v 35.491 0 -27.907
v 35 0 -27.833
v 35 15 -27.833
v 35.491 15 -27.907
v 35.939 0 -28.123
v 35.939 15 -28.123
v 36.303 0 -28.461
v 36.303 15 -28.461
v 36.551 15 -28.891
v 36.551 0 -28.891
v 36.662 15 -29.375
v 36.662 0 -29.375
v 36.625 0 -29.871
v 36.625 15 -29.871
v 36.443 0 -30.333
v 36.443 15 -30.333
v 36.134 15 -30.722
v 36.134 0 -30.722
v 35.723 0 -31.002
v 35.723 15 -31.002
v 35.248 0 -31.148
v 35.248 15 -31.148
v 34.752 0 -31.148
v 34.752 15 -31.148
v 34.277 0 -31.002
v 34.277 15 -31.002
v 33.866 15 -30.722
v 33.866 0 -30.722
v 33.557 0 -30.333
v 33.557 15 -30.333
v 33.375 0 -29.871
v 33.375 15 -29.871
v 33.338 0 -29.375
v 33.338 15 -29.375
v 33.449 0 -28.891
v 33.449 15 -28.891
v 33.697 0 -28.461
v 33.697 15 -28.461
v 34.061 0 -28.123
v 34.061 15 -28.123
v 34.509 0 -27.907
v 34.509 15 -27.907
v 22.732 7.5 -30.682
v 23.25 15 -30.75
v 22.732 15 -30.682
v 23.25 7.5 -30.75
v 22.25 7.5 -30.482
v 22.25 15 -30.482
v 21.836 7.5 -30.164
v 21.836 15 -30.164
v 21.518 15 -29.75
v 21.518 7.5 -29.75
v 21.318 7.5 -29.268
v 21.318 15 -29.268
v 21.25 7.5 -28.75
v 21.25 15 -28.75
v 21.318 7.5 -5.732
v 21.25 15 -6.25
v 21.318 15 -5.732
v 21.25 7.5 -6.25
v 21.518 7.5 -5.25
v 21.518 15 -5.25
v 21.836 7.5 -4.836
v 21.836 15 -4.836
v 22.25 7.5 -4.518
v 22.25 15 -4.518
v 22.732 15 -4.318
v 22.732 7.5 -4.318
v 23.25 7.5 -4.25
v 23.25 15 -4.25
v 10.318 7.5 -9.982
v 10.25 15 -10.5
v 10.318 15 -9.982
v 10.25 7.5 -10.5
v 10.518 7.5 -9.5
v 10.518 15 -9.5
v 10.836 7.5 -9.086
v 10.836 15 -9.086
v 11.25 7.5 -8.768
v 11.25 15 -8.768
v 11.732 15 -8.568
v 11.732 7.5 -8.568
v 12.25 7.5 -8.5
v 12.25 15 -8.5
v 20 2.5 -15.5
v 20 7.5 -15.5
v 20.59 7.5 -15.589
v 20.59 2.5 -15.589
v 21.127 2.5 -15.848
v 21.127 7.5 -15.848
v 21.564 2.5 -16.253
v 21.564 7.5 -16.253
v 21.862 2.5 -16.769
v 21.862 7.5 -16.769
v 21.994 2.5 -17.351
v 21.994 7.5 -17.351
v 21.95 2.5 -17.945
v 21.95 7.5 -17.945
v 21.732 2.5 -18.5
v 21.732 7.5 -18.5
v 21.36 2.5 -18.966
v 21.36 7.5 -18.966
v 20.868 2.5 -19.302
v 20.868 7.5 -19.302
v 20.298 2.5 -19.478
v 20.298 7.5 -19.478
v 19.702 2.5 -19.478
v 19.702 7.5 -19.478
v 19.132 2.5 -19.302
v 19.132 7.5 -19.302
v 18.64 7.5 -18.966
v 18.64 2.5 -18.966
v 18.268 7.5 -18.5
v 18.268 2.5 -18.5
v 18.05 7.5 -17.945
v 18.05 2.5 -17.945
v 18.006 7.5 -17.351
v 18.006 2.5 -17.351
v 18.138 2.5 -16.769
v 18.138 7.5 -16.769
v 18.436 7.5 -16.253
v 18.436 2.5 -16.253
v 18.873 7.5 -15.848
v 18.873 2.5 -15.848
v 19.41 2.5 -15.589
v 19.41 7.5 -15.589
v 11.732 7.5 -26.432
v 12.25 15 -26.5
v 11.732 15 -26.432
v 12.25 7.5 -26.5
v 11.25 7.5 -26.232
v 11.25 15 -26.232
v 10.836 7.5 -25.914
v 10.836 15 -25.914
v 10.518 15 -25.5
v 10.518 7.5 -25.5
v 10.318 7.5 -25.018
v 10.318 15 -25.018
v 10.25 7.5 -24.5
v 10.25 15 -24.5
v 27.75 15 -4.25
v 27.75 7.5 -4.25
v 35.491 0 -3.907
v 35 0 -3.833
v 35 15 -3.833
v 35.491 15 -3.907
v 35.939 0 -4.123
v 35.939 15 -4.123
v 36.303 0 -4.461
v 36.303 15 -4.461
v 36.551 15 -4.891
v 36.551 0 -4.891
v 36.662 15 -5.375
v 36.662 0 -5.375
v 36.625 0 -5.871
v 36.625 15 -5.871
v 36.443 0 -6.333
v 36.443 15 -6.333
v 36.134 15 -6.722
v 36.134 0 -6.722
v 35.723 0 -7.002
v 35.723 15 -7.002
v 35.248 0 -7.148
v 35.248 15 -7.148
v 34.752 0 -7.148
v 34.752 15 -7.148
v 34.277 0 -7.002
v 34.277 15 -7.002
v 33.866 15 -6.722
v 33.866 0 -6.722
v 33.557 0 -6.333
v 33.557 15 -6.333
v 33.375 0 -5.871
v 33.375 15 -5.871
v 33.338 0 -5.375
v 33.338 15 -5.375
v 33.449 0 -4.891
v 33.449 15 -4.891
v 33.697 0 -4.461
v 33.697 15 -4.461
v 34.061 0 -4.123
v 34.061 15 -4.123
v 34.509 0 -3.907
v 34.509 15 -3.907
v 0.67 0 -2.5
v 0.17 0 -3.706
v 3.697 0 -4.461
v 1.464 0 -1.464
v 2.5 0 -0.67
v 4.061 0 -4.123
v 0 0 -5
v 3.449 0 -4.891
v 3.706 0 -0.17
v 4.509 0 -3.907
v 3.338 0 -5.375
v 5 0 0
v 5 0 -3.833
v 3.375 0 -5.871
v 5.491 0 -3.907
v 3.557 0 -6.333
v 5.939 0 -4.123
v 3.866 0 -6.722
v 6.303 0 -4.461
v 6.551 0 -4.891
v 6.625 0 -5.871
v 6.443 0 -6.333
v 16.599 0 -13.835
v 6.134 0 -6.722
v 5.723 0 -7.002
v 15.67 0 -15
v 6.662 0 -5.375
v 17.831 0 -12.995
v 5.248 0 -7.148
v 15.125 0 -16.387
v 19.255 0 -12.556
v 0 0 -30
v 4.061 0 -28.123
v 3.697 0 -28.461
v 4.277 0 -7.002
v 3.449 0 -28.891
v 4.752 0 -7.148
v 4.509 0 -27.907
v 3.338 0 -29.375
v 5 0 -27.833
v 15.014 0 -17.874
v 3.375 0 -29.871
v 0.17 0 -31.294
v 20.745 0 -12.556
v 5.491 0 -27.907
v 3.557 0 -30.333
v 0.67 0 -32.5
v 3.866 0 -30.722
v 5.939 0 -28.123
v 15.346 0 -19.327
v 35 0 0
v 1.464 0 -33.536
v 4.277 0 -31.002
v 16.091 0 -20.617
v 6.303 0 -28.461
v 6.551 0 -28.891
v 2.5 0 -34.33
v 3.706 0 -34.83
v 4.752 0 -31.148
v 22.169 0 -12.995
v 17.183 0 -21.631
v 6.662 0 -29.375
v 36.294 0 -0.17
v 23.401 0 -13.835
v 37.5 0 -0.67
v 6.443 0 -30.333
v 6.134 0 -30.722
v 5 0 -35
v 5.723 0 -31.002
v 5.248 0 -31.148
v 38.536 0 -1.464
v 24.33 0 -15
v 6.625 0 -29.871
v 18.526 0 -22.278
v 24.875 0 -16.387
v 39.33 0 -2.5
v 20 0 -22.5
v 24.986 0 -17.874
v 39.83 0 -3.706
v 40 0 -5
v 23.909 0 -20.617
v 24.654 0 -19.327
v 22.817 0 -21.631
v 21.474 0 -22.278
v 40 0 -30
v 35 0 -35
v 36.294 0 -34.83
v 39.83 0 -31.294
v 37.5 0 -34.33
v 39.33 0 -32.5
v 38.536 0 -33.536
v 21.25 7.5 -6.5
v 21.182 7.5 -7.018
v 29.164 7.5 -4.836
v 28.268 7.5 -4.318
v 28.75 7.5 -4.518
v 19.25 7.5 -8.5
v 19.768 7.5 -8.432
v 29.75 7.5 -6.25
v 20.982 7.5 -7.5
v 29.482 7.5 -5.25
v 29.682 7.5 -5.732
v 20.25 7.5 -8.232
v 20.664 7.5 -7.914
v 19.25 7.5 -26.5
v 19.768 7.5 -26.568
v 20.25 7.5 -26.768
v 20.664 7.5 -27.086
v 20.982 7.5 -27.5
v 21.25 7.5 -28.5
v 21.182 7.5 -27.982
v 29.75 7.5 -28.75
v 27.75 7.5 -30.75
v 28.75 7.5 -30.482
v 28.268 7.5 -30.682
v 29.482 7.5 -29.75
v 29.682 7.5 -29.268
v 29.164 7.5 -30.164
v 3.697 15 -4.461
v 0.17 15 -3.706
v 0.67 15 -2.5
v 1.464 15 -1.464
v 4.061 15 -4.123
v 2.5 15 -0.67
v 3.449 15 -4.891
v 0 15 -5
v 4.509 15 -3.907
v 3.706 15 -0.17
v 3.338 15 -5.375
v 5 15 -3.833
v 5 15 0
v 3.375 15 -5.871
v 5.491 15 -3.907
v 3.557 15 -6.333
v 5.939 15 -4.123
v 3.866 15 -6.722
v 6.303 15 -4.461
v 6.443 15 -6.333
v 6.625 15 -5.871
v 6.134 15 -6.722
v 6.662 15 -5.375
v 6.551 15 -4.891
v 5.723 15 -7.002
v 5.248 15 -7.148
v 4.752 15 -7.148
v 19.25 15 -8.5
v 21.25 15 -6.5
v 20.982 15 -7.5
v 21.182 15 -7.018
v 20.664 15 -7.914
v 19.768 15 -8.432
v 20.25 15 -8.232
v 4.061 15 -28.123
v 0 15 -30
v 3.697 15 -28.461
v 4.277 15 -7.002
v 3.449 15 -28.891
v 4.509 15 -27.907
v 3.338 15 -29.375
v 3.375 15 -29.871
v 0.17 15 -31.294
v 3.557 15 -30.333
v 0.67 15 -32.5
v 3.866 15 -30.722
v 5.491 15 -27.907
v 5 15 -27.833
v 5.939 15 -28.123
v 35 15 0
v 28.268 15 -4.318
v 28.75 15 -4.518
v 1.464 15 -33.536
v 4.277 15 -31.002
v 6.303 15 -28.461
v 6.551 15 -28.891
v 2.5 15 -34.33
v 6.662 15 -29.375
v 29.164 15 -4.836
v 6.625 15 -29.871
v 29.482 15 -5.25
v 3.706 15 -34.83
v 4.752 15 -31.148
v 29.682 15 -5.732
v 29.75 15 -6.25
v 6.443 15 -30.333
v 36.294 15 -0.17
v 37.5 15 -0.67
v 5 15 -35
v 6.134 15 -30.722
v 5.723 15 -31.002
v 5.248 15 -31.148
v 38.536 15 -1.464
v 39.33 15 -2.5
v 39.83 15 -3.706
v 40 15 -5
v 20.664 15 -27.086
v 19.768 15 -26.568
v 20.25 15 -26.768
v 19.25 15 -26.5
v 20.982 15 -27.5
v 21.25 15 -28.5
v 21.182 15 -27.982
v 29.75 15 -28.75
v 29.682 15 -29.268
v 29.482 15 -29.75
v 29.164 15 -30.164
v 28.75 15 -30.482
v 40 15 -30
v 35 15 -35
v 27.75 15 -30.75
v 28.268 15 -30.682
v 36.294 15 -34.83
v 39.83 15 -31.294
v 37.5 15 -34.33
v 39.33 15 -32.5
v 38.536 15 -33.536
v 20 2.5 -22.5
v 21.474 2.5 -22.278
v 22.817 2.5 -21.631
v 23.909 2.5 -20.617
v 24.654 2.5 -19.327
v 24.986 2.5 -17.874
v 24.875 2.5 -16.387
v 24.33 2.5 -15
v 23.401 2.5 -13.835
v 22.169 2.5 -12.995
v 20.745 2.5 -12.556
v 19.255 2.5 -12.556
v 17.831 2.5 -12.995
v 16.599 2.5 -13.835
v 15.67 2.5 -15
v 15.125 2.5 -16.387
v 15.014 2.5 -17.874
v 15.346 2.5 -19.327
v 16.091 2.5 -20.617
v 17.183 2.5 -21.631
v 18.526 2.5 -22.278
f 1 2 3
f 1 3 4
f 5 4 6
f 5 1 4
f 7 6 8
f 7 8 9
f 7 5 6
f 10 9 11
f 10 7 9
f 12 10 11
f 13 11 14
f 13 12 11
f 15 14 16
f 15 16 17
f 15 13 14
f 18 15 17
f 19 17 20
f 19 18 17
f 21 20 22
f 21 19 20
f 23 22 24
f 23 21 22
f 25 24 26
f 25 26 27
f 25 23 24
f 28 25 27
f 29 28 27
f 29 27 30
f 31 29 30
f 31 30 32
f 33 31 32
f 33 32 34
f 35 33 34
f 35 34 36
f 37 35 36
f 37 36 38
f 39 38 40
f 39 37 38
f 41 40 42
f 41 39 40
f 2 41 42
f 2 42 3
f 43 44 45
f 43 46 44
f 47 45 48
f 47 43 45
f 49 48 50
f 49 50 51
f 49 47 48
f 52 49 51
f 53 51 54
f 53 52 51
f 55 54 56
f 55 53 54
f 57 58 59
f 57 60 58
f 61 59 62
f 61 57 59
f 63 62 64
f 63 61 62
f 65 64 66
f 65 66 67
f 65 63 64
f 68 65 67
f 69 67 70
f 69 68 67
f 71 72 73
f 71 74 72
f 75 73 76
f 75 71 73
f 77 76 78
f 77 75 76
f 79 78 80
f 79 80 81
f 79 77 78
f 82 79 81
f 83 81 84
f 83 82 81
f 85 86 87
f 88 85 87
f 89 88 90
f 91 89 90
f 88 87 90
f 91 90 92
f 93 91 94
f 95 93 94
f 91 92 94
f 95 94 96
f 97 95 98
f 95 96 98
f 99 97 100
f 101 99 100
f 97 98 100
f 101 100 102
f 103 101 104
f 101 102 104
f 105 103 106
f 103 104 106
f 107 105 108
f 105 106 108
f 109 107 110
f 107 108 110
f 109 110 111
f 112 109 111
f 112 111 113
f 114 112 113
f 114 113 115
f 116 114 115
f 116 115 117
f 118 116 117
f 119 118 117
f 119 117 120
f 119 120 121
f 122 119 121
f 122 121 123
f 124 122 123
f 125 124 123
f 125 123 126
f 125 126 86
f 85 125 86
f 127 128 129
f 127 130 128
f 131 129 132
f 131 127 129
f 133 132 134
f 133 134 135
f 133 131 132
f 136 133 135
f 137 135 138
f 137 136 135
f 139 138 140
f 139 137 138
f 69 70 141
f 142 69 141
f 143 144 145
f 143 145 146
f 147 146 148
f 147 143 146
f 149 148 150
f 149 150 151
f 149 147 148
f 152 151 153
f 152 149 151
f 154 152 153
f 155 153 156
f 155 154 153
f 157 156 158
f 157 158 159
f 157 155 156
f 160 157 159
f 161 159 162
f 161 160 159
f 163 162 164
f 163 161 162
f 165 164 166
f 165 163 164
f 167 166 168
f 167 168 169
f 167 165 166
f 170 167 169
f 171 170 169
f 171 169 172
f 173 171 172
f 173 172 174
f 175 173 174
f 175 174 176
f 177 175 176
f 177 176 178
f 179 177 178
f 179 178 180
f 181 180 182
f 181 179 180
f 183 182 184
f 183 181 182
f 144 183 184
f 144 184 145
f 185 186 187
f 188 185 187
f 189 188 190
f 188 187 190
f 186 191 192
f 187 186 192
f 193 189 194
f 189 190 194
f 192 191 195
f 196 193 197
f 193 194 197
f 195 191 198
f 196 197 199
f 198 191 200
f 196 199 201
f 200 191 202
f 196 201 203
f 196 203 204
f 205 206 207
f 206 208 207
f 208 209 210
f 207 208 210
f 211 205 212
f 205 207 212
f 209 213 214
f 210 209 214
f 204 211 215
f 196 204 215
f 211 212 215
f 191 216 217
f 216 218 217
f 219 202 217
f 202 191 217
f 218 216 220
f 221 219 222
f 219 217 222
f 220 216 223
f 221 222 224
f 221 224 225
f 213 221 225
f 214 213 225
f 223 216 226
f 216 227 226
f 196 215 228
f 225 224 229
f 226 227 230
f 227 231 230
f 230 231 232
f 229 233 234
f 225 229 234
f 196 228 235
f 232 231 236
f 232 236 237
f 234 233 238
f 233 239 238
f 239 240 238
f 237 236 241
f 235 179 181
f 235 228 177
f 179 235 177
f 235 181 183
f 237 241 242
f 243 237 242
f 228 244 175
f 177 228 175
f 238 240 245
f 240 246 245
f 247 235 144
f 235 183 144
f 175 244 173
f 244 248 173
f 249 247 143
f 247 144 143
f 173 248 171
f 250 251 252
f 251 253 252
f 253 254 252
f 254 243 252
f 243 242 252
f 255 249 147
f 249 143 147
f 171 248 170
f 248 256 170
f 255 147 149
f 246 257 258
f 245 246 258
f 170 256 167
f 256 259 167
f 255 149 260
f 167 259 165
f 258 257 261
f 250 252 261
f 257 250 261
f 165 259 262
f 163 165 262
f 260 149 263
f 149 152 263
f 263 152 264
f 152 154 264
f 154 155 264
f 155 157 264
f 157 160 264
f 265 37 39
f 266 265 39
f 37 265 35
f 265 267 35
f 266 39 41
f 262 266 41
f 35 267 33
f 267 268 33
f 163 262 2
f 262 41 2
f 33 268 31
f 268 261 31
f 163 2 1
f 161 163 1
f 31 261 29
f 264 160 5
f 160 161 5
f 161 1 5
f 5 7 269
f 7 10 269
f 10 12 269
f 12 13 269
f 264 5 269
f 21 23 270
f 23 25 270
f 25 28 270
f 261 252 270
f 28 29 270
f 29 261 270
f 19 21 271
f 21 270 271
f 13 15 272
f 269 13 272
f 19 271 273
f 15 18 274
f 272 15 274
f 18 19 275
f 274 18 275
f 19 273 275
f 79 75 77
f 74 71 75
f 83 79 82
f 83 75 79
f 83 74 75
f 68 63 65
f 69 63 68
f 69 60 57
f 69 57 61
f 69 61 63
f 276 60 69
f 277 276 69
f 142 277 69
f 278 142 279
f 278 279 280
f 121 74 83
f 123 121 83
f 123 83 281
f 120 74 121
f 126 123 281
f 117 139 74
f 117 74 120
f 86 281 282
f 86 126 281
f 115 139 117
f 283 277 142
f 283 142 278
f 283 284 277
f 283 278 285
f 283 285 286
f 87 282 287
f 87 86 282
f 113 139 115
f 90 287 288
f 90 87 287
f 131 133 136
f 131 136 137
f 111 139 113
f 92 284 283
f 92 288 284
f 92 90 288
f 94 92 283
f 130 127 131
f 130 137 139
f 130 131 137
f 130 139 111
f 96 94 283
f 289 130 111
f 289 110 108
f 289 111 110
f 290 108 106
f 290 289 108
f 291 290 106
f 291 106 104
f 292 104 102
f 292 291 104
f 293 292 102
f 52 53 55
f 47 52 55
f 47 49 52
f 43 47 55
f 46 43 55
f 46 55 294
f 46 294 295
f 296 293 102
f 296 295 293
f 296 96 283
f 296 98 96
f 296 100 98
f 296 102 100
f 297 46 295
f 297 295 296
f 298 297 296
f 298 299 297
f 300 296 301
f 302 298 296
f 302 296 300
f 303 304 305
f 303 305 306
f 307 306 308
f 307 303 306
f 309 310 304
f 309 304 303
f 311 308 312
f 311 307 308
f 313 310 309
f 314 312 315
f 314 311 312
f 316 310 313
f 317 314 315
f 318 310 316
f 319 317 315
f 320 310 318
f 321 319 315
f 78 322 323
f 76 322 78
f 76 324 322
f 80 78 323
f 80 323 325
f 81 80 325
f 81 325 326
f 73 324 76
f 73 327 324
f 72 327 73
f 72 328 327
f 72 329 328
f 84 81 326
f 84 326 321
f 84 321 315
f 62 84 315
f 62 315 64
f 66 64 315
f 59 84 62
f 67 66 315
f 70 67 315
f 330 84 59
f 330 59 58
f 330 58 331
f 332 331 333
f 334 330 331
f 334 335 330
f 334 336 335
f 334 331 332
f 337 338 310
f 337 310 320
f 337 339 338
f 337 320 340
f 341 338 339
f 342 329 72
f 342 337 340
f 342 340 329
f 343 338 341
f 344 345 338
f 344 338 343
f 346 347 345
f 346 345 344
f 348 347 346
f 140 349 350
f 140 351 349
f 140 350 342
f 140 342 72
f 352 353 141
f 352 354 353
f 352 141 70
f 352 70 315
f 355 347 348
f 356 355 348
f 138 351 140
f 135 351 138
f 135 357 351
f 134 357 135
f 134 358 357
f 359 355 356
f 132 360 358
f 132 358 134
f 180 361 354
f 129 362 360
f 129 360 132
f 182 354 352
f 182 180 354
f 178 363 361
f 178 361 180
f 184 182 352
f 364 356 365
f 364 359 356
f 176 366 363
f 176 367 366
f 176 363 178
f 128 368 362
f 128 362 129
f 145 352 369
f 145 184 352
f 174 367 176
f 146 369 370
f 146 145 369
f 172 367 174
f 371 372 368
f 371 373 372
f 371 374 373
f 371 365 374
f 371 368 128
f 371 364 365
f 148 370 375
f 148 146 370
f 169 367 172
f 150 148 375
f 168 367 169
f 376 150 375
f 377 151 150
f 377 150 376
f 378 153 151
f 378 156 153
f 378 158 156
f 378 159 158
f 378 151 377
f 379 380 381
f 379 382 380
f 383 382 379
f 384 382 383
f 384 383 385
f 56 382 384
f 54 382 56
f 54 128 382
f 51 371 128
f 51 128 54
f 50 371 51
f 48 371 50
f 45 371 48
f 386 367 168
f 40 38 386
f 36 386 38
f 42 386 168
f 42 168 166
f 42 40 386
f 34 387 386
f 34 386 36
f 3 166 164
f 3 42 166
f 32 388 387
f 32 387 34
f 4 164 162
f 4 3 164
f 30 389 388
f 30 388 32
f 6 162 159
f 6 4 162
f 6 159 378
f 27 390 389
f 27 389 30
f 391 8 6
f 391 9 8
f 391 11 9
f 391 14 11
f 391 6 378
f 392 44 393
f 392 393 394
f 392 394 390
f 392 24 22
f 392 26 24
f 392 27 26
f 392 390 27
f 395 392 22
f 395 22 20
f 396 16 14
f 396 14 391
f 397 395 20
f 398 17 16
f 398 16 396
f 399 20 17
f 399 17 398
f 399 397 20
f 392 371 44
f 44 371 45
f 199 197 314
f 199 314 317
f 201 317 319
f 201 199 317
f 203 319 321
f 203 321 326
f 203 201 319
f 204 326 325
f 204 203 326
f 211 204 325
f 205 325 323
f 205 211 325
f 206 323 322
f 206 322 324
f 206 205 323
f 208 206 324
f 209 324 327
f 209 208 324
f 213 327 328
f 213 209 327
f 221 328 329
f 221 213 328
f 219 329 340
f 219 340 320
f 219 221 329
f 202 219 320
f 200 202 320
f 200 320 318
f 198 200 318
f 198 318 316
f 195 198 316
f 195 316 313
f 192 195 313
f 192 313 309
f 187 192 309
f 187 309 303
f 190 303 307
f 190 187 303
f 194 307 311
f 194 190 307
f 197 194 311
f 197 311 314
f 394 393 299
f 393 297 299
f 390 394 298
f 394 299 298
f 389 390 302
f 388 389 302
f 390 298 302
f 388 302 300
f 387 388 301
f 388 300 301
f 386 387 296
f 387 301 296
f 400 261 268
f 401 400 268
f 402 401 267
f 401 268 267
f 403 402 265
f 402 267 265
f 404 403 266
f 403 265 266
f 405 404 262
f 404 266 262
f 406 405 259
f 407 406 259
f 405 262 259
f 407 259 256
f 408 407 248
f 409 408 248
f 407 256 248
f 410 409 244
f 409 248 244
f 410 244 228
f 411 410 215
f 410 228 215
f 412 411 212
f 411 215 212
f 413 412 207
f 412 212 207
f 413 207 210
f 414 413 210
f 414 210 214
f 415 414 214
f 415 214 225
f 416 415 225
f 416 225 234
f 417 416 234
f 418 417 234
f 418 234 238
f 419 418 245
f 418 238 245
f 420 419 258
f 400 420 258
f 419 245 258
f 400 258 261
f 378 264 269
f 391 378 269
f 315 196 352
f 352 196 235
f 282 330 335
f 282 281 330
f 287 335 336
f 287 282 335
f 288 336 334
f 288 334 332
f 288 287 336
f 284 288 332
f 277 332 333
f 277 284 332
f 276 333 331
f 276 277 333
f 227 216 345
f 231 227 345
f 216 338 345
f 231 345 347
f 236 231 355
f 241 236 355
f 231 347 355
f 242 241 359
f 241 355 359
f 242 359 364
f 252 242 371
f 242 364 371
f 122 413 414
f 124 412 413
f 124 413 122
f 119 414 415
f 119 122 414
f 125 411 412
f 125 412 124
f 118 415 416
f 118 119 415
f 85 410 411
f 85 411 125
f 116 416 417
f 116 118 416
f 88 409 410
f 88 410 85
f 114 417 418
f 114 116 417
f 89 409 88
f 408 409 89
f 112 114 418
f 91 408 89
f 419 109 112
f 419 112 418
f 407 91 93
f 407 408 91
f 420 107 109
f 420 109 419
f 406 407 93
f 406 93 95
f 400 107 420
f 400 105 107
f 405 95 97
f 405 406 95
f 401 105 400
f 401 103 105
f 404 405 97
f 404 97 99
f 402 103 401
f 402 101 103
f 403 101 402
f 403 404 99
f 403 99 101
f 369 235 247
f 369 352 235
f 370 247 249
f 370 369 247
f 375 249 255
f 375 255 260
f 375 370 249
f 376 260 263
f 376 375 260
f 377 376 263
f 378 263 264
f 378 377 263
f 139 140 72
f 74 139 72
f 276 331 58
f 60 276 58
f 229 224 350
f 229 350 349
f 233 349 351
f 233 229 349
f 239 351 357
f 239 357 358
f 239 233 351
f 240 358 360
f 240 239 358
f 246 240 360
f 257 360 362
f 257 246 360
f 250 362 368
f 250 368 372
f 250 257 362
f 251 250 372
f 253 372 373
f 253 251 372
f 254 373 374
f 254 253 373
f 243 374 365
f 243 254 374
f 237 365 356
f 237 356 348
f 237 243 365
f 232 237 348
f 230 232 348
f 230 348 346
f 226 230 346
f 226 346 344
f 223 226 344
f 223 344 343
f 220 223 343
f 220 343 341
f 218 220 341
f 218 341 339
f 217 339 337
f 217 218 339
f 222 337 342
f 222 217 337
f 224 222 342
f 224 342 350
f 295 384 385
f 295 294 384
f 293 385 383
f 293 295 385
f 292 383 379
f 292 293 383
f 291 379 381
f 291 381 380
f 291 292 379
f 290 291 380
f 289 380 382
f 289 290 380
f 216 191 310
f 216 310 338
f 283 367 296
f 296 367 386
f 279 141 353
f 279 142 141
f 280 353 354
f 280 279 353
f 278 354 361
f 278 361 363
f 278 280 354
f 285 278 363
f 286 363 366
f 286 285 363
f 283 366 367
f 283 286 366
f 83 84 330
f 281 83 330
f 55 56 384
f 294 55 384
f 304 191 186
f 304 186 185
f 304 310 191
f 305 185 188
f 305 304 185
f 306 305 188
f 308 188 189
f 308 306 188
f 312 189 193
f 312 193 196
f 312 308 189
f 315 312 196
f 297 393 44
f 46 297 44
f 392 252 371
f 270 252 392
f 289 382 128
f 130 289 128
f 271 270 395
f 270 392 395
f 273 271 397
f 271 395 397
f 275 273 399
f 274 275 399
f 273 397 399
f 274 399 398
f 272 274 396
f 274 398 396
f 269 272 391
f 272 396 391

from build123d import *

# Parameters (mm, degrees)
SKETCH1_W           = 40
SKETCH1_H           = 35
SKETCH1_R           = 1.666666667
BOSS_EXTRUDE1_DEPTH = 15
FILLET1_R           = 5
CUT_EXTRUDE1_DEPTH  = 7.5
FILLET2_R           = 2
SKETCH5_R           = 2
CUT_EXTRUDE2_DEPTH  = 7.5
SKETCH6_R           = 5
CUT_EXTRUDE3_DEPTH  = 2.5


with BuildPart() as part:
    # Sketch1 → Boss-Extrude1 (new body)
    with BuildSketch(Plane(origin=(0, 0, 0), x_dir=(1, 0, 0), z_dir=(0, 1, 0))):
        with Locations((20, 17.5)):
            Rectangle(SKETCH1_W, SKETCH1_H)
        with Locations(Location((5, 29.5, 0), (0, 0, 270))):
            Circle(SKETCH1_R, mode=Mode.SUBTRACT)
        with Locations(Location((35, 29.5, 0), (0, 0, 270))):
            Circle(SKETCH1_R, mode=Mode.SUBTRACT)
        with Locations(Location((5, 5.5, 0), (0, 0, 270))):
            Circle(SKETCH1_R, mode=Mode.SUBTRACT)
        with Locations(Location((35, 5.5, 0), (0, 0, 270))):
            Circle(SKETCH1_R, mode=Mode.SUBTRACT)
    extrude(amount=BOSS_EXTRUDE1_DEPTH)

    # Fillet1
    fillet1_edges = [part.edges().sort_by_distance(p)[0] for p in [
        (0, 7.5, -35),
        (40, 7.5, -35),
        (40, 7.5, 0),
        (0, 7.5, 0),
    ]]
    fillet(fillet1_edges, radius=FILLET1_R)

    # Sketch4 → Cut-Extrude1 (cut)
    with BuildSketch(Plane(origin=(0, 15, 0), x_dir=(1, 0, 0), z_dir=(0, 1, 0))):
        Polygon((29.75, 30.75), (21.25, 30.75), (21.25, 26.5), (10.25, 26.5), (10.25, 8.5), (21.25, 8.5), (21.25, 4.25), (29.75, 4.25), align=None)
    extrude(amount=-CUT_EXTRUDE1_DEPTH, mode=Mode.SUBTRACT)

    # Fillet2
    fillet2_edges = [part.edges().sort_by_distance(p)[0] for p in [
        (21.25, 11.25, -26.5),
        (21.25, 11.25, -30.75),
        (29.75, 11.25, -30.75),
        (29.75, 11.25, -4.25),
        (21.25, 11.25, -4.25),
        (21.25, 11.25, -8.5),
        (10.25, 11.25, -8.5),
        (10.25, 11.25, -26.5),
    ]]
    fillet(fillet2_edges, radius=FILLET2_R)

    # Sketch5 → Cut-Extrude2 (cut)
    with BuildSketch(Plane(origin=(0, 7.5, 0), x_dir=(1, 0, 0), z_dir=(0, 1, 0))):
        with Locations(Location((20, 17.5, 0), (0, 0, 270))):
            Circle(SKETCH5_R)
    extrude(amount=-CUT_EXTRUDE2_DEPTH, mode=Mode.SUBTRACT)

    # Sketch6 → Cut-Extrude3 (cut)
    with BuildSketch(Plane.XZ):
        with Locations(Location((20, -17.5, 0), (0, 0, 270))):
            Circle(SKETCH6_R)
    extrude(amount=-CUT_EXTRUDE3_DEPTH, mode=Mode.SUBTRACT)


solid = part.part
